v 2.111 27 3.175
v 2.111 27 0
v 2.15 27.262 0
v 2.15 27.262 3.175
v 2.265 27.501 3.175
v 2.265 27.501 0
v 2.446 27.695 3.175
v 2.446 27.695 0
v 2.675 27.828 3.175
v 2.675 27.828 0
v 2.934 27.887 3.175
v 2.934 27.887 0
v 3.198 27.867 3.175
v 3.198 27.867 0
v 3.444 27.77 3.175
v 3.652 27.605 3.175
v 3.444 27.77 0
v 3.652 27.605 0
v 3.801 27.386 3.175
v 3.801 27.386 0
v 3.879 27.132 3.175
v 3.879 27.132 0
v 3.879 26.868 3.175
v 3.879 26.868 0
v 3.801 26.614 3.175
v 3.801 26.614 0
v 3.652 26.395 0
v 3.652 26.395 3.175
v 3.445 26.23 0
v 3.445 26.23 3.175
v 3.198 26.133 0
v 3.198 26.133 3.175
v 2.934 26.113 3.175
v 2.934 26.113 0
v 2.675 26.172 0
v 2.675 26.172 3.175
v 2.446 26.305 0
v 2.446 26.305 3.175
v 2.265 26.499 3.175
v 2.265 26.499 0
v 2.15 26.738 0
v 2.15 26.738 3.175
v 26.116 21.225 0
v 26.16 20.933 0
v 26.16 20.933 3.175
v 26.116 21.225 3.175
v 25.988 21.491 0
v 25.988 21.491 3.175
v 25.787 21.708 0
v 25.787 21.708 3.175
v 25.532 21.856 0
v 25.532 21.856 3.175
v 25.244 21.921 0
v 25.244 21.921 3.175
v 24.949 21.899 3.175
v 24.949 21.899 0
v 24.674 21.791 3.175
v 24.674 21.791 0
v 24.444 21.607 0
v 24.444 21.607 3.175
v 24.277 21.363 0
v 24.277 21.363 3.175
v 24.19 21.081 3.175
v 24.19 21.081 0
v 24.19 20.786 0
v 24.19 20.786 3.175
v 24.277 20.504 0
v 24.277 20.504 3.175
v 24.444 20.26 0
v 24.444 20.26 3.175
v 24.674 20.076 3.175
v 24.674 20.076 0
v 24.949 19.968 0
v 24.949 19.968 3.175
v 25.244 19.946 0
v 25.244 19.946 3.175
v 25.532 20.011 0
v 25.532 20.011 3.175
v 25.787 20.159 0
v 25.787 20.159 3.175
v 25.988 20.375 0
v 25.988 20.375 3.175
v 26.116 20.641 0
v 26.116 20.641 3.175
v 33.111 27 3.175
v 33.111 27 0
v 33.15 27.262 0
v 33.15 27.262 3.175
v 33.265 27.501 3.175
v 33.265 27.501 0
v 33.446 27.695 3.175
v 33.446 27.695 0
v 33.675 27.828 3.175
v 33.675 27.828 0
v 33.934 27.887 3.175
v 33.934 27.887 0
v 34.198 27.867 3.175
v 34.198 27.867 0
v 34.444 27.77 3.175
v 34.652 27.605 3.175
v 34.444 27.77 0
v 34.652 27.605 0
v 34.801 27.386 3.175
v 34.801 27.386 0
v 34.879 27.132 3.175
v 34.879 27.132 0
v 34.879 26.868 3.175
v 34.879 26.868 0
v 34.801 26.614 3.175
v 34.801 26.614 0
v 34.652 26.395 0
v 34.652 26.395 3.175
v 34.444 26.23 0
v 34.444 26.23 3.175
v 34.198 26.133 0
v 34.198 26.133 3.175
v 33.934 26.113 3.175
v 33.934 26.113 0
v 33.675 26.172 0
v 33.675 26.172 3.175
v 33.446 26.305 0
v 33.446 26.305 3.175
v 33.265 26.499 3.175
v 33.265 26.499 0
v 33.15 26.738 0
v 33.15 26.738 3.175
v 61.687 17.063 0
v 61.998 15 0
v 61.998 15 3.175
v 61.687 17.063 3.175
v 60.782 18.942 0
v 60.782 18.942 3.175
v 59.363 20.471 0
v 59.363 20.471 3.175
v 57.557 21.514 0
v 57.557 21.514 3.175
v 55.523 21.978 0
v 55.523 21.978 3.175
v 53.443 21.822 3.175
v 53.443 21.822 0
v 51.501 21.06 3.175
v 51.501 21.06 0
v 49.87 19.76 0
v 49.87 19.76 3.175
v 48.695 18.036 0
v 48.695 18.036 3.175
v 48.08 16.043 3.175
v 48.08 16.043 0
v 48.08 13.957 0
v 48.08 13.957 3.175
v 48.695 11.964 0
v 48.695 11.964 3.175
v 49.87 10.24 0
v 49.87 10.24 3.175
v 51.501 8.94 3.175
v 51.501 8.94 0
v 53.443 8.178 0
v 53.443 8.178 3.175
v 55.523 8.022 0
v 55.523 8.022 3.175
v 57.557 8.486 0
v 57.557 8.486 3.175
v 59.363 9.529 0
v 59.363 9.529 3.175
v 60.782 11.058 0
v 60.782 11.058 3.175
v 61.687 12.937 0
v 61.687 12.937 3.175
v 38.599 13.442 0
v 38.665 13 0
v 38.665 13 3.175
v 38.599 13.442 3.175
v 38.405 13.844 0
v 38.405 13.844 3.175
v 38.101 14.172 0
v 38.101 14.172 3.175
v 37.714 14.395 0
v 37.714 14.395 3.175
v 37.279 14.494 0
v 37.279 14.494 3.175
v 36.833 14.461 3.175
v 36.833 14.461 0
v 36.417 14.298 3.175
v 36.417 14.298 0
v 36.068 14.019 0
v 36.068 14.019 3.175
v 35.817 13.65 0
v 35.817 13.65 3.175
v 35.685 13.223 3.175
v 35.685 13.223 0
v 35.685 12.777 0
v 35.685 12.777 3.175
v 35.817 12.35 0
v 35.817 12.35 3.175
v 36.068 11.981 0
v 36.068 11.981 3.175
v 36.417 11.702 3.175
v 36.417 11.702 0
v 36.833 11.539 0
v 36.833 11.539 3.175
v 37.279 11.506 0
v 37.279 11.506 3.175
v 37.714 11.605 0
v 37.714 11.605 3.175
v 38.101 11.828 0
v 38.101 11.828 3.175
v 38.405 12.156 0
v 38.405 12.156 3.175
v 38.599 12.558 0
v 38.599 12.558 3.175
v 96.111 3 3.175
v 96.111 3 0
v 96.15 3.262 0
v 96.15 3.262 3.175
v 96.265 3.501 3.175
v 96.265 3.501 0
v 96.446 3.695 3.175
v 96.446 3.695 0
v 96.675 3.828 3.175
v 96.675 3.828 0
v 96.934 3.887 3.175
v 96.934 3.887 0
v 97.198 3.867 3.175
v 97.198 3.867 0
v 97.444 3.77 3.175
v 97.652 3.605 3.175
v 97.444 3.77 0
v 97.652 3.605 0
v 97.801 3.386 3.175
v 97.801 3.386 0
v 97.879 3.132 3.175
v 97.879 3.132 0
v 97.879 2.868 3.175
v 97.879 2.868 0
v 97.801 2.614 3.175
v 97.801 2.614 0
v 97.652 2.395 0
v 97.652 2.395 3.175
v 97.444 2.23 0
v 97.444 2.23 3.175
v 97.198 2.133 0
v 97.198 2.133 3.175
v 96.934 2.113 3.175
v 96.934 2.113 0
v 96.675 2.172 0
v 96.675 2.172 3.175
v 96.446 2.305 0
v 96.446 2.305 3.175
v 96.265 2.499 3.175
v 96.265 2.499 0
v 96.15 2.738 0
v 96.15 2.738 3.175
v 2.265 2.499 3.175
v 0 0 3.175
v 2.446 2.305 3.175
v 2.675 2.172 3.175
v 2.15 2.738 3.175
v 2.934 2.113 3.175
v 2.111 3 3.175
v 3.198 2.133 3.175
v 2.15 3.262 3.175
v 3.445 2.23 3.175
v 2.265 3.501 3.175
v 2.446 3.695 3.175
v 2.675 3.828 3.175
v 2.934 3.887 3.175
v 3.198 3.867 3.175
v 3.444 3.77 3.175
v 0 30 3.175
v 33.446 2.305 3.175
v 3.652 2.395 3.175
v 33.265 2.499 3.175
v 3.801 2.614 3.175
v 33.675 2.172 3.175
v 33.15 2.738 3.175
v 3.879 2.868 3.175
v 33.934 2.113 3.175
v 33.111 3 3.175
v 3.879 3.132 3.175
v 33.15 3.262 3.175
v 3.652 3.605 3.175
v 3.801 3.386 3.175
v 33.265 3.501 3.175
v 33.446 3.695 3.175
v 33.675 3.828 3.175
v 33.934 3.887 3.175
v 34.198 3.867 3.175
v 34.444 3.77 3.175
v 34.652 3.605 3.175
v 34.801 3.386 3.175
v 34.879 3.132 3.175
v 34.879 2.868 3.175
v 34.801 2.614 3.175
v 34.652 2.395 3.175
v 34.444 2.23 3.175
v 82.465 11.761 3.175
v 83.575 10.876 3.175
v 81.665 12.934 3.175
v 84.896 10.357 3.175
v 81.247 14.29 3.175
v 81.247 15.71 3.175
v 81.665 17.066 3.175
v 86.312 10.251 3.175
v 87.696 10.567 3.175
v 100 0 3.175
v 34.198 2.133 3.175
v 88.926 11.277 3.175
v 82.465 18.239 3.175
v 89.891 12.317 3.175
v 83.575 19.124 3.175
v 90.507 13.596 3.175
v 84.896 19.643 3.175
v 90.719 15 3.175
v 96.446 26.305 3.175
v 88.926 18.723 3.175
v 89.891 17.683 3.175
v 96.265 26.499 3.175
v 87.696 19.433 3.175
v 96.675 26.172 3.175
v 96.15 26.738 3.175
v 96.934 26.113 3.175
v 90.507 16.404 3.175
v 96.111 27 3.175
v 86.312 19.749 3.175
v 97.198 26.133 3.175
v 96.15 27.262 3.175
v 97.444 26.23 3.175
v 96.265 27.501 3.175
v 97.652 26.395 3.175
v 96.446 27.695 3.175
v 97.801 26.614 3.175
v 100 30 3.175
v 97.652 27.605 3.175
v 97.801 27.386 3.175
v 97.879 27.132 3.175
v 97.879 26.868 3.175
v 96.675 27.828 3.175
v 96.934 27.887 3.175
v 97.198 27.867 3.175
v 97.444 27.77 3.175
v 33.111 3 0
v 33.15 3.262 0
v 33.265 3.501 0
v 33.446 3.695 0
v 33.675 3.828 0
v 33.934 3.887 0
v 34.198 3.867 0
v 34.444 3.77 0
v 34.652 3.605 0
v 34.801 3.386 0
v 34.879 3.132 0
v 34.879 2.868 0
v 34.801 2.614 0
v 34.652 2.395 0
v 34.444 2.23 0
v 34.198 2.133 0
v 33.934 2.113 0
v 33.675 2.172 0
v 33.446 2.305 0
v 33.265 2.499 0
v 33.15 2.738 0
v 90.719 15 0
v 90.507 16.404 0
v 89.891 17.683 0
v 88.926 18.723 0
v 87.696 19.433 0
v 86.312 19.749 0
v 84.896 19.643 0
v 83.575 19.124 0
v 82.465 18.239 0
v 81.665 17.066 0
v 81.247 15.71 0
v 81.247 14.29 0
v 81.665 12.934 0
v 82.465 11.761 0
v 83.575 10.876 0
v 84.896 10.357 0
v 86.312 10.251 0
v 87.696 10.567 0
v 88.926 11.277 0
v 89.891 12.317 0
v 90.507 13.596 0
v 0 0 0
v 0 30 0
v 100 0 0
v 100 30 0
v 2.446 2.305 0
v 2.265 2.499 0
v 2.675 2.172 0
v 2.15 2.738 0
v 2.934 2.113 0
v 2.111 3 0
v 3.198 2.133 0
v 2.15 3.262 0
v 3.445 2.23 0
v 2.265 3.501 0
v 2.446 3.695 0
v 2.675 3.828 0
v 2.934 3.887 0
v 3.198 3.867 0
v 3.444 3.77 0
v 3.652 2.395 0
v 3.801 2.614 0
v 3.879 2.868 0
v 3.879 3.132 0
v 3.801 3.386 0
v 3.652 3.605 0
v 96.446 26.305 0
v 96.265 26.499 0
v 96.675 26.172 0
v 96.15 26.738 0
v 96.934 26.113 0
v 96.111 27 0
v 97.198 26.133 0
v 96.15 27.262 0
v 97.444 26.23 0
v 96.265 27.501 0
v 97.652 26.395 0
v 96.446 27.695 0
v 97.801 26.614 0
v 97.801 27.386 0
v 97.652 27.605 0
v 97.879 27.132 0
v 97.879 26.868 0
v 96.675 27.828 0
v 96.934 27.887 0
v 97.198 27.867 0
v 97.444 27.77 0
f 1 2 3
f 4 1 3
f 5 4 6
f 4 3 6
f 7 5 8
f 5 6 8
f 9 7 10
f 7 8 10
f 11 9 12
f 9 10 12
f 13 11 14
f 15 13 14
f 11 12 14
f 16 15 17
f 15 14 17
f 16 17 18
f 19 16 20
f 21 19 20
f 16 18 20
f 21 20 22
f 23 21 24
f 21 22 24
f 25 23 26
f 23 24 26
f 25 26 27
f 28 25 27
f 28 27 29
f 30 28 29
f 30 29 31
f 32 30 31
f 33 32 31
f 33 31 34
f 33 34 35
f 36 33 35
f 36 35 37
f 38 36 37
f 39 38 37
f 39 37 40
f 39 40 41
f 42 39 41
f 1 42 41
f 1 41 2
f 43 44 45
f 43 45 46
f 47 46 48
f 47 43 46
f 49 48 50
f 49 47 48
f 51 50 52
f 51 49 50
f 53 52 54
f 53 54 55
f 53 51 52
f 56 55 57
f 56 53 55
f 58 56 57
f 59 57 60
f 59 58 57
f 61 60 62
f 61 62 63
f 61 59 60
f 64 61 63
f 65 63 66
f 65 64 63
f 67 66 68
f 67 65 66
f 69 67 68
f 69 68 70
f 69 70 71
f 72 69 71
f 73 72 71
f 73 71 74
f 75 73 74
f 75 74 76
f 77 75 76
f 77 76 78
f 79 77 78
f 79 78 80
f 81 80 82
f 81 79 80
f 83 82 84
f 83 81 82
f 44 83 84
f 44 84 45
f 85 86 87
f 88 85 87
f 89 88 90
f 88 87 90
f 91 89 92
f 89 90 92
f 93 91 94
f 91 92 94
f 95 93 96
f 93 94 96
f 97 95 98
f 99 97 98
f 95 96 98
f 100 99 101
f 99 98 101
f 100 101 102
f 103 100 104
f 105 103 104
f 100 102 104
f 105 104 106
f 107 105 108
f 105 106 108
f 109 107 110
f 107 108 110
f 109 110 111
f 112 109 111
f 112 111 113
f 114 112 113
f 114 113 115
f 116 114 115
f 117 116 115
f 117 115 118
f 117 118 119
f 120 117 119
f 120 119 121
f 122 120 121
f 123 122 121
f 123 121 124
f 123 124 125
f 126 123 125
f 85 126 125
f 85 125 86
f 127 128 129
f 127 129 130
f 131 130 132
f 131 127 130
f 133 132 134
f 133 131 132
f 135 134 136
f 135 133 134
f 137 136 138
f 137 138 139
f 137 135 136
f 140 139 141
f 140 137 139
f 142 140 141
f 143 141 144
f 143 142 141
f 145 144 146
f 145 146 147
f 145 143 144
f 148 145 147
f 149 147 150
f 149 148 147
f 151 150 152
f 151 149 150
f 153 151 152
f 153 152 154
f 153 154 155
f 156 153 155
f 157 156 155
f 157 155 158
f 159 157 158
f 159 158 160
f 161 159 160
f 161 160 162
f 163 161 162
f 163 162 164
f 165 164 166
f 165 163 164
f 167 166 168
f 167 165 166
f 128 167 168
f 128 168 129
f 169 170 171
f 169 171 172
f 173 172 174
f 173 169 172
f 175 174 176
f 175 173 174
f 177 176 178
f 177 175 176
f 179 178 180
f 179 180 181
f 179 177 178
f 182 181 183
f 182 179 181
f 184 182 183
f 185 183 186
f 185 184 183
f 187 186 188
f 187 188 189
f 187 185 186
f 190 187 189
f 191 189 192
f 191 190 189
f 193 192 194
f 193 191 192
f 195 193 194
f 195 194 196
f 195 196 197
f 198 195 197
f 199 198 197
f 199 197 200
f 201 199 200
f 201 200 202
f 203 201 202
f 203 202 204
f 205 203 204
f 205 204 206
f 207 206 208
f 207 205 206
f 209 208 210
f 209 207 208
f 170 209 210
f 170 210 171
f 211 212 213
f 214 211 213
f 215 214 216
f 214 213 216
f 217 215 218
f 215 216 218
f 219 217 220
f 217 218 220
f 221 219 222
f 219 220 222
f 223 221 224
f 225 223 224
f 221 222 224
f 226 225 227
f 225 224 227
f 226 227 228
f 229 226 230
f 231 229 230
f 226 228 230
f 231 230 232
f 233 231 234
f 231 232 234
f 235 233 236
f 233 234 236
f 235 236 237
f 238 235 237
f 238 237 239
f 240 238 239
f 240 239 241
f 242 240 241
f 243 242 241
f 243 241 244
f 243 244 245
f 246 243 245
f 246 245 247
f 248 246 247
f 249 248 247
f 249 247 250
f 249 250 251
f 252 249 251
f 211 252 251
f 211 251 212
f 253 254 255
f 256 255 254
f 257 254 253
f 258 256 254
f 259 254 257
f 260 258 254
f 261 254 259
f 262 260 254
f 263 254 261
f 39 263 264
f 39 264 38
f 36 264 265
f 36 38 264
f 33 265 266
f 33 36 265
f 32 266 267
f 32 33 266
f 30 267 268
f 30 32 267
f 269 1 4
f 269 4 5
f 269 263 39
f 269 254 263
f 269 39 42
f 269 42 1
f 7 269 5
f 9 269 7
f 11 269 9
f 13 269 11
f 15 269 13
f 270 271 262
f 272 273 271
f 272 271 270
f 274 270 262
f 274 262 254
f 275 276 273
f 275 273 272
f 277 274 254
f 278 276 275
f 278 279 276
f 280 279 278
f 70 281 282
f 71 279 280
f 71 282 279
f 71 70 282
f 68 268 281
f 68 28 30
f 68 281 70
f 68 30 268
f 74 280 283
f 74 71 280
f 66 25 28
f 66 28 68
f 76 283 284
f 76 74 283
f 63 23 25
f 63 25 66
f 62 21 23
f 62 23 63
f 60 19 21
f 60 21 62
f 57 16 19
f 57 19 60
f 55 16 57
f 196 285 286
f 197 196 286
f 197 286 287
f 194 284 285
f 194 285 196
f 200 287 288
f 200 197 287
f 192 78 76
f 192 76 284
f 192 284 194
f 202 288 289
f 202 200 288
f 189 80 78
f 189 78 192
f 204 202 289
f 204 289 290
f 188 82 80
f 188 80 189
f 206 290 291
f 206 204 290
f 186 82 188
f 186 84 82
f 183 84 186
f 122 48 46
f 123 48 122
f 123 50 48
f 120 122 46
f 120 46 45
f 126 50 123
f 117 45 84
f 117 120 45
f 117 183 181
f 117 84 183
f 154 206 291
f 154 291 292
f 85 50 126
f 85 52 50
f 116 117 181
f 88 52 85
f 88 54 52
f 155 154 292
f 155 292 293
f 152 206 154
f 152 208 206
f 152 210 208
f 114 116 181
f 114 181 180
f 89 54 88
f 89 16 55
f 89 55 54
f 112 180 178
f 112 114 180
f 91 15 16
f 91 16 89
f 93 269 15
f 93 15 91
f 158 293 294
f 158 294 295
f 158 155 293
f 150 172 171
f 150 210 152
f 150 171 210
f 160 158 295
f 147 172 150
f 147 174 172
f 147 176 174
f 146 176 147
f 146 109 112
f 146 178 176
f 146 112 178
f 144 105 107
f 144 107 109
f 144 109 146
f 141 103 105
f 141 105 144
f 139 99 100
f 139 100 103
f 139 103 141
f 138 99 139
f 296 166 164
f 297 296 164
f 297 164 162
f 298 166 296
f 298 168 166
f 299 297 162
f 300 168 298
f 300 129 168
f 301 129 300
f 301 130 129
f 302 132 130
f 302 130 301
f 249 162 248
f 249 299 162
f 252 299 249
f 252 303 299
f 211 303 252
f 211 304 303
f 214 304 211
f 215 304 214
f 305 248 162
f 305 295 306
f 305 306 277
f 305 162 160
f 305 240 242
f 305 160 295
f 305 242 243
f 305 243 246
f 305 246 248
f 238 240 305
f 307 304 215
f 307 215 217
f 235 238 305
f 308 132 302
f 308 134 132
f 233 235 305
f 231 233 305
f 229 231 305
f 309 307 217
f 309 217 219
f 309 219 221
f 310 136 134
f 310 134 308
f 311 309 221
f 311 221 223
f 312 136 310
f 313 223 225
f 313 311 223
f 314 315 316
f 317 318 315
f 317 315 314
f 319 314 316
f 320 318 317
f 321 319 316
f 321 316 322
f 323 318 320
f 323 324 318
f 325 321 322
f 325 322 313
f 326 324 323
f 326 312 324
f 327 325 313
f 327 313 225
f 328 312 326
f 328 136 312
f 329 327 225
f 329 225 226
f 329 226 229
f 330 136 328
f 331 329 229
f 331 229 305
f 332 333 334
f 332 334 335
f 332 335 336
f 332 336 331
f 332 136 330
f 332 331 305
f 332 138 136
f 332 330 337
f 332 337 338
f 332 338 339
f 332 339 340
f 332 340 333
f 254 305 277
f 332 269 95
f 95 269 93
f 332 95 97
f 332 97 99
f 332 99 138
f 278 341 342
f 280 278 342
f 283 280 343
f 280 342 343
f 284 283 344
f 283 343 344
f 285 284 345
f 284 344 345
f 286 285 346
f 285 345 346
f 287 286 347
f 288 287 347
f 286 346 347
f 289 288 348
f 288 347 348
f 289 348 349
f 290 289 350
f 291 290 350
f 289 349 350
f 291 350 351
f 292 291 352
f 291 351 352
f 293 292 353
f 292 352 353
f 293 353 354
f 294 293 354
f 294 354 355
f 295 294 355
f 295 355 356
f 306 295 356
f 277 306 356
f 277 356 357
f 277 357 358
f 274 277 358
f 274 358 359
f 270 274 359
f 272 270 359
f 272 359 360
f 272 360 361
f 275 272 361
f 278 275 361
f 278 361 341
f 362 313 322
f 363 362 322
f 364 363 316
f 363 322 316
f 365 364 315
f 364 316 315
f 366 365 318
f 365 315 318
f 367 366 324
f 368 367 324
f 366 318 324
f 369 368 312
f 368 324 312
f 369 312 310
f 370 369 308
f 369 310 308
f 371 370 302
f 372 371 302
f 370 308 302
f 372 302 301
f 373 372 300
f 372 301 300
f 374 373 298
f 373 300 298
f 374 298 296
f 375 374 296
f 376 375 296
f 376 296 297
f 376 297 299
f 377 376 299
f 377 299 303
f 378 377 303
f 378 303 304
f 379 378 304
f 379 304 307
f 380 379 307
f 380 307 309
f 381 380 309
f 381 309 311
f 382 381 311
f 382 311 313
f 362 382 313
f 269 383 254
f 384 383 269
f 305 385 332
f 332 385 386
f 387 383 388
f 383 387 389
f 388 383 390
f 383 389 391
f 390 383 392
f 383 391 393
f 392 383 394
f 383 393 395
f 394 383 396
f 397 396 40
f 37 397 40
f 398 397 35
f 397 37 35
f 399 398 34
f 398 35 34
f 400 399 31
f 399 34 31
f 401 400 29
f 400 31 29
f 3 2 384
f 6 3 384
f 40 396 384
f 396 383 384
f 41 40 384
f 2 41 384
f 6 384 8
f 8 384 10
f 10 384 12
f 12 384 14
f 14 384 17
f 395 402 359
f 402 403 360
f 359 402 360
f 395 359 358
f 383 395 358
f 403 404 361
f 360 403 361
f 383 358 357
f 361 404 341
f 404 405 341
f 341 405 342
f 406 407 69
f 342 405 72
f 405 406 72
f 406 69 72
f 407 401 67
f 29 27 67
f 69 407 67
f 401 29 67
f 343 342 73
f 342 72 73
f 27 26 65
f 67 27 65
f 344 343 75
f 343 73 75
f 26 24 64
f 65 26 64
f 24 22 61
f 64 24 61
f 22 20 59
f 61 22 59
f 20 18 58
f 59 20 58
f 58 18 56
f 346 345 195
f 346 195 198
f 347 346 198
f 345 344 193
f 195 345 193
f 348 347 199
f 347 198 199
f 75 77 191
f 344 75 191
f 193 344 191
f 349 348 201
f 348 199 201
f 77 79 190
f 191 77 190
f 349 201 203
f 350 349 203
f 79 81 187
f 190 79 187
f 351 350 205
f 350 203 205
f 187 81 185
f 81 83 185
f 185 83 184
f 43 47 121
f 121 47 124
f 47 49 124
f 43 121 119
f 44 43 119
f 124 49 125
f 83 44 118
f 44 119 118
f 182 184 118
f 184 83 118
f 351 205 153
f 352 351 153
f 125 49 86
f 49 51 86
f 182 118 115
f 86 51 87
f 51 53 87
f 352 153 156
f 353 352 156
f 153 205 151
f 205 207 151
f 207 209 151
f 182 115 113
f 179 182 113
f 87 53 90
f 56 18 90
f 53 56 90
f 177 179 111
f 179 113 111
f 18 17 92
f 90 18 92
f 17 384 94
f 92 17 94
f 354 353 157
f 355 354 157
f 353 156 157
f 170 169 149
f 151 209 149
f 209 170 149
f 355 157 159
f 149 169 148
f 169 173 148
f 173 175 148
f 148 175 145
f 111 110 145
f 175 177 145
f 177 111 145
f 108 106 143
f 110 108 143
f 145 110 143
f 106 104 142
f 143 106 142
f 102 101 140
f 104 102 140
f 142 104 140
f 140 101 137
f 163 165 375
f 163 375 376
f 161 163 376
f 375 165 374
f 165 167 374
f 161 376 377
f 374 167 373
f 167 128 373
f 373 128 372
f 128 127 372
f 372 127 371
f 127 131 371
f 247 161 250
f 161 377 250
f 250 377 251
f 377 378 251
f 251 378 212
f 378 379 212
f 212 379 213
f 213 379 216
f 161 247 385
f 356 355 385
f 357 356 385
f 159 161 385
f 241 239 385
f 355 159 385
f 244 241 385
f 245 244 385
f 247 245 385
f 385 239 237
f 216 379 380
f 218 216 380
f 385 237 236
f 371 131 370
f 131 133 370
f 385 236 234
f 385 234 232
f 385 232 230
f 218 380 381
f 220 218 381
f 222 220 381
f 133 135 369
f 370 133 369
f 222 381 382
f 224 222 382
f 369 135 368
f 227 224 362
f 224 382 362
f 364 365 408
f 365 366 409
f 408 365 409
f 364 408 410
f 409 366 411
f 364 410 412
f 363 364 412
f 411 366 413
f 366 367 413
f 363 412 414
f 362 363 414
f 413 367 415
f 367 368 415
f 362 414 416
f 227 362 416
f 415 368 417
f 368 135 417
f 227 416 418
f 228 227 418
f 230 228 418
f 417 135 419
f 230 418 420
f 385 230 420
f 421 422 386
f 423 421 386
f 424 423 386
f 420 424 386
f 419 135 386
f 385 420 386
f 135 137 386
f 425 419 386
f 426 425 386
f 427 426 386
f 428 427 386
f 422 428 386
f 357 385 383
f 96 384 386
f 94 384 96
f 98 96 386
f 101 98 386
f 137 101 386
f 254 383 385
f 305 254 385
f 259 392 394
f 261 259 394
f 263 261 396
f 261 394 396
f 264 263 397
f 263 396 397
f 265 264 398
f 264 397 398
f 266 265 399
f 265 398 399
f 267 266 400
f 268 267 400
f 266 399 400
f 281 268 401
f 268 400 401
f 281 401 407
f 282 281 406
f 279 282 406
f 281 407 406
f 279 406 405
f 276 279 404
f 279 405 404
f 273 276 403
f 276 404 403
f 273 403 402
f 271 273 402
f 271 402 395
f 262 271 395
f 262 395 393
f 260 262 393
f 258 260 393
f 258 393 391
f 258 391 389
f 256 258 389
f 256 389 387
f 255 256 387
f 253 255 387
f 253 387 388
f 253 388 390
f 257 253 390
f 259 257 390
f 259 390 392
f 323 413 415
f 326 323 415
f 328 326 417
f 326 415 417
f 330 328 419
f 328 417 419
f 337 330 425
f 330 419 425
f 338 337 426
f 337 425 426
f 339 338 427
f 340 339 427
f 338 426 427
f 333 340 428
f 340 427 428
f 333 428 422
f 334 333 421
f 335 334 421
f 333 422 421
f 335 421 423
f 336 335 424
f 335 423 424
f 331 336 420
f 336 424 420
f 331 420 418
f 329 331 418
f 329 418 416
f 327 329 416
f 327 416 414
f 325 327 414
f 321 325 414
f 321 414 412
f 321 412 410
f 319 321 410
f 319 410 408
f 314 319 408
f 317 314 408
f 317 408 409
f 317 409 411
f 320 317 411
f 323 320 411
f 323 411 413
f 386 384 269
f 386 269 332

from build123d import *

# Parameters (mm, degrees)
SKETCH1_W             = 100
SKETCH1_H             = 30
SKETCH1_R             = 6.9977
SKETCH1_R_2           = 1.4986
SKETCH1_R_3           = 0.9906
BOSS_EXTRUDE2_DEPTH   = 3.175
F_2_56_TAPPED_HOLE1_D = 1.778
SKETCH4_R             = 4.7625
CUT_EXTRUDE1_DEPTH    = 105.45133137


with BuildPart() as part:
    # Sketch1 → Boss-Extrude2 (new body)
    with BuildSketch(Plane.XY):
        with Locations((50, 15)):
            Rectangle(SKETCH1_W, SKETCH1_H)
        with Locations((55, 15)):
            Circle(SKETCH1_R, mode=Mode.SUBTRACT)
        with Locations((37.166699296, 13)):
            Circle(SKETCH1_R_2, mode=Mode.SUBTRACT)
        with Locations((25.169778966, 20.933400182)):
            Circle(SKETCH1_R_3, mode=Mode.SUBTRACT)
    extrude(amount=BOSS_EXTRUDE2_DEPTH)

    # #2-56 Tapped Hole1 (through all)
    with Locations(Plane.XY.offset(3.175)):
        with Locations((97, 27), (97, 3), (3, 27), (3, 3), (34, 27), (34, 3)):
            Hole(F_2_56_TAPPED_HOLE1_D / 2)

    # Sketch4 → Cut-Extrude1 (cut, through all)
    with BuildSketch(Plane.XY.offset(3.175)):
        with Locations((85.9562, 15)):
            Circle(SKETCH4_R)
    extrude(amount=-CUT_EXTRUDE1_DEPTH, mode=Mode.SUBTRACT)


solid = part.part
